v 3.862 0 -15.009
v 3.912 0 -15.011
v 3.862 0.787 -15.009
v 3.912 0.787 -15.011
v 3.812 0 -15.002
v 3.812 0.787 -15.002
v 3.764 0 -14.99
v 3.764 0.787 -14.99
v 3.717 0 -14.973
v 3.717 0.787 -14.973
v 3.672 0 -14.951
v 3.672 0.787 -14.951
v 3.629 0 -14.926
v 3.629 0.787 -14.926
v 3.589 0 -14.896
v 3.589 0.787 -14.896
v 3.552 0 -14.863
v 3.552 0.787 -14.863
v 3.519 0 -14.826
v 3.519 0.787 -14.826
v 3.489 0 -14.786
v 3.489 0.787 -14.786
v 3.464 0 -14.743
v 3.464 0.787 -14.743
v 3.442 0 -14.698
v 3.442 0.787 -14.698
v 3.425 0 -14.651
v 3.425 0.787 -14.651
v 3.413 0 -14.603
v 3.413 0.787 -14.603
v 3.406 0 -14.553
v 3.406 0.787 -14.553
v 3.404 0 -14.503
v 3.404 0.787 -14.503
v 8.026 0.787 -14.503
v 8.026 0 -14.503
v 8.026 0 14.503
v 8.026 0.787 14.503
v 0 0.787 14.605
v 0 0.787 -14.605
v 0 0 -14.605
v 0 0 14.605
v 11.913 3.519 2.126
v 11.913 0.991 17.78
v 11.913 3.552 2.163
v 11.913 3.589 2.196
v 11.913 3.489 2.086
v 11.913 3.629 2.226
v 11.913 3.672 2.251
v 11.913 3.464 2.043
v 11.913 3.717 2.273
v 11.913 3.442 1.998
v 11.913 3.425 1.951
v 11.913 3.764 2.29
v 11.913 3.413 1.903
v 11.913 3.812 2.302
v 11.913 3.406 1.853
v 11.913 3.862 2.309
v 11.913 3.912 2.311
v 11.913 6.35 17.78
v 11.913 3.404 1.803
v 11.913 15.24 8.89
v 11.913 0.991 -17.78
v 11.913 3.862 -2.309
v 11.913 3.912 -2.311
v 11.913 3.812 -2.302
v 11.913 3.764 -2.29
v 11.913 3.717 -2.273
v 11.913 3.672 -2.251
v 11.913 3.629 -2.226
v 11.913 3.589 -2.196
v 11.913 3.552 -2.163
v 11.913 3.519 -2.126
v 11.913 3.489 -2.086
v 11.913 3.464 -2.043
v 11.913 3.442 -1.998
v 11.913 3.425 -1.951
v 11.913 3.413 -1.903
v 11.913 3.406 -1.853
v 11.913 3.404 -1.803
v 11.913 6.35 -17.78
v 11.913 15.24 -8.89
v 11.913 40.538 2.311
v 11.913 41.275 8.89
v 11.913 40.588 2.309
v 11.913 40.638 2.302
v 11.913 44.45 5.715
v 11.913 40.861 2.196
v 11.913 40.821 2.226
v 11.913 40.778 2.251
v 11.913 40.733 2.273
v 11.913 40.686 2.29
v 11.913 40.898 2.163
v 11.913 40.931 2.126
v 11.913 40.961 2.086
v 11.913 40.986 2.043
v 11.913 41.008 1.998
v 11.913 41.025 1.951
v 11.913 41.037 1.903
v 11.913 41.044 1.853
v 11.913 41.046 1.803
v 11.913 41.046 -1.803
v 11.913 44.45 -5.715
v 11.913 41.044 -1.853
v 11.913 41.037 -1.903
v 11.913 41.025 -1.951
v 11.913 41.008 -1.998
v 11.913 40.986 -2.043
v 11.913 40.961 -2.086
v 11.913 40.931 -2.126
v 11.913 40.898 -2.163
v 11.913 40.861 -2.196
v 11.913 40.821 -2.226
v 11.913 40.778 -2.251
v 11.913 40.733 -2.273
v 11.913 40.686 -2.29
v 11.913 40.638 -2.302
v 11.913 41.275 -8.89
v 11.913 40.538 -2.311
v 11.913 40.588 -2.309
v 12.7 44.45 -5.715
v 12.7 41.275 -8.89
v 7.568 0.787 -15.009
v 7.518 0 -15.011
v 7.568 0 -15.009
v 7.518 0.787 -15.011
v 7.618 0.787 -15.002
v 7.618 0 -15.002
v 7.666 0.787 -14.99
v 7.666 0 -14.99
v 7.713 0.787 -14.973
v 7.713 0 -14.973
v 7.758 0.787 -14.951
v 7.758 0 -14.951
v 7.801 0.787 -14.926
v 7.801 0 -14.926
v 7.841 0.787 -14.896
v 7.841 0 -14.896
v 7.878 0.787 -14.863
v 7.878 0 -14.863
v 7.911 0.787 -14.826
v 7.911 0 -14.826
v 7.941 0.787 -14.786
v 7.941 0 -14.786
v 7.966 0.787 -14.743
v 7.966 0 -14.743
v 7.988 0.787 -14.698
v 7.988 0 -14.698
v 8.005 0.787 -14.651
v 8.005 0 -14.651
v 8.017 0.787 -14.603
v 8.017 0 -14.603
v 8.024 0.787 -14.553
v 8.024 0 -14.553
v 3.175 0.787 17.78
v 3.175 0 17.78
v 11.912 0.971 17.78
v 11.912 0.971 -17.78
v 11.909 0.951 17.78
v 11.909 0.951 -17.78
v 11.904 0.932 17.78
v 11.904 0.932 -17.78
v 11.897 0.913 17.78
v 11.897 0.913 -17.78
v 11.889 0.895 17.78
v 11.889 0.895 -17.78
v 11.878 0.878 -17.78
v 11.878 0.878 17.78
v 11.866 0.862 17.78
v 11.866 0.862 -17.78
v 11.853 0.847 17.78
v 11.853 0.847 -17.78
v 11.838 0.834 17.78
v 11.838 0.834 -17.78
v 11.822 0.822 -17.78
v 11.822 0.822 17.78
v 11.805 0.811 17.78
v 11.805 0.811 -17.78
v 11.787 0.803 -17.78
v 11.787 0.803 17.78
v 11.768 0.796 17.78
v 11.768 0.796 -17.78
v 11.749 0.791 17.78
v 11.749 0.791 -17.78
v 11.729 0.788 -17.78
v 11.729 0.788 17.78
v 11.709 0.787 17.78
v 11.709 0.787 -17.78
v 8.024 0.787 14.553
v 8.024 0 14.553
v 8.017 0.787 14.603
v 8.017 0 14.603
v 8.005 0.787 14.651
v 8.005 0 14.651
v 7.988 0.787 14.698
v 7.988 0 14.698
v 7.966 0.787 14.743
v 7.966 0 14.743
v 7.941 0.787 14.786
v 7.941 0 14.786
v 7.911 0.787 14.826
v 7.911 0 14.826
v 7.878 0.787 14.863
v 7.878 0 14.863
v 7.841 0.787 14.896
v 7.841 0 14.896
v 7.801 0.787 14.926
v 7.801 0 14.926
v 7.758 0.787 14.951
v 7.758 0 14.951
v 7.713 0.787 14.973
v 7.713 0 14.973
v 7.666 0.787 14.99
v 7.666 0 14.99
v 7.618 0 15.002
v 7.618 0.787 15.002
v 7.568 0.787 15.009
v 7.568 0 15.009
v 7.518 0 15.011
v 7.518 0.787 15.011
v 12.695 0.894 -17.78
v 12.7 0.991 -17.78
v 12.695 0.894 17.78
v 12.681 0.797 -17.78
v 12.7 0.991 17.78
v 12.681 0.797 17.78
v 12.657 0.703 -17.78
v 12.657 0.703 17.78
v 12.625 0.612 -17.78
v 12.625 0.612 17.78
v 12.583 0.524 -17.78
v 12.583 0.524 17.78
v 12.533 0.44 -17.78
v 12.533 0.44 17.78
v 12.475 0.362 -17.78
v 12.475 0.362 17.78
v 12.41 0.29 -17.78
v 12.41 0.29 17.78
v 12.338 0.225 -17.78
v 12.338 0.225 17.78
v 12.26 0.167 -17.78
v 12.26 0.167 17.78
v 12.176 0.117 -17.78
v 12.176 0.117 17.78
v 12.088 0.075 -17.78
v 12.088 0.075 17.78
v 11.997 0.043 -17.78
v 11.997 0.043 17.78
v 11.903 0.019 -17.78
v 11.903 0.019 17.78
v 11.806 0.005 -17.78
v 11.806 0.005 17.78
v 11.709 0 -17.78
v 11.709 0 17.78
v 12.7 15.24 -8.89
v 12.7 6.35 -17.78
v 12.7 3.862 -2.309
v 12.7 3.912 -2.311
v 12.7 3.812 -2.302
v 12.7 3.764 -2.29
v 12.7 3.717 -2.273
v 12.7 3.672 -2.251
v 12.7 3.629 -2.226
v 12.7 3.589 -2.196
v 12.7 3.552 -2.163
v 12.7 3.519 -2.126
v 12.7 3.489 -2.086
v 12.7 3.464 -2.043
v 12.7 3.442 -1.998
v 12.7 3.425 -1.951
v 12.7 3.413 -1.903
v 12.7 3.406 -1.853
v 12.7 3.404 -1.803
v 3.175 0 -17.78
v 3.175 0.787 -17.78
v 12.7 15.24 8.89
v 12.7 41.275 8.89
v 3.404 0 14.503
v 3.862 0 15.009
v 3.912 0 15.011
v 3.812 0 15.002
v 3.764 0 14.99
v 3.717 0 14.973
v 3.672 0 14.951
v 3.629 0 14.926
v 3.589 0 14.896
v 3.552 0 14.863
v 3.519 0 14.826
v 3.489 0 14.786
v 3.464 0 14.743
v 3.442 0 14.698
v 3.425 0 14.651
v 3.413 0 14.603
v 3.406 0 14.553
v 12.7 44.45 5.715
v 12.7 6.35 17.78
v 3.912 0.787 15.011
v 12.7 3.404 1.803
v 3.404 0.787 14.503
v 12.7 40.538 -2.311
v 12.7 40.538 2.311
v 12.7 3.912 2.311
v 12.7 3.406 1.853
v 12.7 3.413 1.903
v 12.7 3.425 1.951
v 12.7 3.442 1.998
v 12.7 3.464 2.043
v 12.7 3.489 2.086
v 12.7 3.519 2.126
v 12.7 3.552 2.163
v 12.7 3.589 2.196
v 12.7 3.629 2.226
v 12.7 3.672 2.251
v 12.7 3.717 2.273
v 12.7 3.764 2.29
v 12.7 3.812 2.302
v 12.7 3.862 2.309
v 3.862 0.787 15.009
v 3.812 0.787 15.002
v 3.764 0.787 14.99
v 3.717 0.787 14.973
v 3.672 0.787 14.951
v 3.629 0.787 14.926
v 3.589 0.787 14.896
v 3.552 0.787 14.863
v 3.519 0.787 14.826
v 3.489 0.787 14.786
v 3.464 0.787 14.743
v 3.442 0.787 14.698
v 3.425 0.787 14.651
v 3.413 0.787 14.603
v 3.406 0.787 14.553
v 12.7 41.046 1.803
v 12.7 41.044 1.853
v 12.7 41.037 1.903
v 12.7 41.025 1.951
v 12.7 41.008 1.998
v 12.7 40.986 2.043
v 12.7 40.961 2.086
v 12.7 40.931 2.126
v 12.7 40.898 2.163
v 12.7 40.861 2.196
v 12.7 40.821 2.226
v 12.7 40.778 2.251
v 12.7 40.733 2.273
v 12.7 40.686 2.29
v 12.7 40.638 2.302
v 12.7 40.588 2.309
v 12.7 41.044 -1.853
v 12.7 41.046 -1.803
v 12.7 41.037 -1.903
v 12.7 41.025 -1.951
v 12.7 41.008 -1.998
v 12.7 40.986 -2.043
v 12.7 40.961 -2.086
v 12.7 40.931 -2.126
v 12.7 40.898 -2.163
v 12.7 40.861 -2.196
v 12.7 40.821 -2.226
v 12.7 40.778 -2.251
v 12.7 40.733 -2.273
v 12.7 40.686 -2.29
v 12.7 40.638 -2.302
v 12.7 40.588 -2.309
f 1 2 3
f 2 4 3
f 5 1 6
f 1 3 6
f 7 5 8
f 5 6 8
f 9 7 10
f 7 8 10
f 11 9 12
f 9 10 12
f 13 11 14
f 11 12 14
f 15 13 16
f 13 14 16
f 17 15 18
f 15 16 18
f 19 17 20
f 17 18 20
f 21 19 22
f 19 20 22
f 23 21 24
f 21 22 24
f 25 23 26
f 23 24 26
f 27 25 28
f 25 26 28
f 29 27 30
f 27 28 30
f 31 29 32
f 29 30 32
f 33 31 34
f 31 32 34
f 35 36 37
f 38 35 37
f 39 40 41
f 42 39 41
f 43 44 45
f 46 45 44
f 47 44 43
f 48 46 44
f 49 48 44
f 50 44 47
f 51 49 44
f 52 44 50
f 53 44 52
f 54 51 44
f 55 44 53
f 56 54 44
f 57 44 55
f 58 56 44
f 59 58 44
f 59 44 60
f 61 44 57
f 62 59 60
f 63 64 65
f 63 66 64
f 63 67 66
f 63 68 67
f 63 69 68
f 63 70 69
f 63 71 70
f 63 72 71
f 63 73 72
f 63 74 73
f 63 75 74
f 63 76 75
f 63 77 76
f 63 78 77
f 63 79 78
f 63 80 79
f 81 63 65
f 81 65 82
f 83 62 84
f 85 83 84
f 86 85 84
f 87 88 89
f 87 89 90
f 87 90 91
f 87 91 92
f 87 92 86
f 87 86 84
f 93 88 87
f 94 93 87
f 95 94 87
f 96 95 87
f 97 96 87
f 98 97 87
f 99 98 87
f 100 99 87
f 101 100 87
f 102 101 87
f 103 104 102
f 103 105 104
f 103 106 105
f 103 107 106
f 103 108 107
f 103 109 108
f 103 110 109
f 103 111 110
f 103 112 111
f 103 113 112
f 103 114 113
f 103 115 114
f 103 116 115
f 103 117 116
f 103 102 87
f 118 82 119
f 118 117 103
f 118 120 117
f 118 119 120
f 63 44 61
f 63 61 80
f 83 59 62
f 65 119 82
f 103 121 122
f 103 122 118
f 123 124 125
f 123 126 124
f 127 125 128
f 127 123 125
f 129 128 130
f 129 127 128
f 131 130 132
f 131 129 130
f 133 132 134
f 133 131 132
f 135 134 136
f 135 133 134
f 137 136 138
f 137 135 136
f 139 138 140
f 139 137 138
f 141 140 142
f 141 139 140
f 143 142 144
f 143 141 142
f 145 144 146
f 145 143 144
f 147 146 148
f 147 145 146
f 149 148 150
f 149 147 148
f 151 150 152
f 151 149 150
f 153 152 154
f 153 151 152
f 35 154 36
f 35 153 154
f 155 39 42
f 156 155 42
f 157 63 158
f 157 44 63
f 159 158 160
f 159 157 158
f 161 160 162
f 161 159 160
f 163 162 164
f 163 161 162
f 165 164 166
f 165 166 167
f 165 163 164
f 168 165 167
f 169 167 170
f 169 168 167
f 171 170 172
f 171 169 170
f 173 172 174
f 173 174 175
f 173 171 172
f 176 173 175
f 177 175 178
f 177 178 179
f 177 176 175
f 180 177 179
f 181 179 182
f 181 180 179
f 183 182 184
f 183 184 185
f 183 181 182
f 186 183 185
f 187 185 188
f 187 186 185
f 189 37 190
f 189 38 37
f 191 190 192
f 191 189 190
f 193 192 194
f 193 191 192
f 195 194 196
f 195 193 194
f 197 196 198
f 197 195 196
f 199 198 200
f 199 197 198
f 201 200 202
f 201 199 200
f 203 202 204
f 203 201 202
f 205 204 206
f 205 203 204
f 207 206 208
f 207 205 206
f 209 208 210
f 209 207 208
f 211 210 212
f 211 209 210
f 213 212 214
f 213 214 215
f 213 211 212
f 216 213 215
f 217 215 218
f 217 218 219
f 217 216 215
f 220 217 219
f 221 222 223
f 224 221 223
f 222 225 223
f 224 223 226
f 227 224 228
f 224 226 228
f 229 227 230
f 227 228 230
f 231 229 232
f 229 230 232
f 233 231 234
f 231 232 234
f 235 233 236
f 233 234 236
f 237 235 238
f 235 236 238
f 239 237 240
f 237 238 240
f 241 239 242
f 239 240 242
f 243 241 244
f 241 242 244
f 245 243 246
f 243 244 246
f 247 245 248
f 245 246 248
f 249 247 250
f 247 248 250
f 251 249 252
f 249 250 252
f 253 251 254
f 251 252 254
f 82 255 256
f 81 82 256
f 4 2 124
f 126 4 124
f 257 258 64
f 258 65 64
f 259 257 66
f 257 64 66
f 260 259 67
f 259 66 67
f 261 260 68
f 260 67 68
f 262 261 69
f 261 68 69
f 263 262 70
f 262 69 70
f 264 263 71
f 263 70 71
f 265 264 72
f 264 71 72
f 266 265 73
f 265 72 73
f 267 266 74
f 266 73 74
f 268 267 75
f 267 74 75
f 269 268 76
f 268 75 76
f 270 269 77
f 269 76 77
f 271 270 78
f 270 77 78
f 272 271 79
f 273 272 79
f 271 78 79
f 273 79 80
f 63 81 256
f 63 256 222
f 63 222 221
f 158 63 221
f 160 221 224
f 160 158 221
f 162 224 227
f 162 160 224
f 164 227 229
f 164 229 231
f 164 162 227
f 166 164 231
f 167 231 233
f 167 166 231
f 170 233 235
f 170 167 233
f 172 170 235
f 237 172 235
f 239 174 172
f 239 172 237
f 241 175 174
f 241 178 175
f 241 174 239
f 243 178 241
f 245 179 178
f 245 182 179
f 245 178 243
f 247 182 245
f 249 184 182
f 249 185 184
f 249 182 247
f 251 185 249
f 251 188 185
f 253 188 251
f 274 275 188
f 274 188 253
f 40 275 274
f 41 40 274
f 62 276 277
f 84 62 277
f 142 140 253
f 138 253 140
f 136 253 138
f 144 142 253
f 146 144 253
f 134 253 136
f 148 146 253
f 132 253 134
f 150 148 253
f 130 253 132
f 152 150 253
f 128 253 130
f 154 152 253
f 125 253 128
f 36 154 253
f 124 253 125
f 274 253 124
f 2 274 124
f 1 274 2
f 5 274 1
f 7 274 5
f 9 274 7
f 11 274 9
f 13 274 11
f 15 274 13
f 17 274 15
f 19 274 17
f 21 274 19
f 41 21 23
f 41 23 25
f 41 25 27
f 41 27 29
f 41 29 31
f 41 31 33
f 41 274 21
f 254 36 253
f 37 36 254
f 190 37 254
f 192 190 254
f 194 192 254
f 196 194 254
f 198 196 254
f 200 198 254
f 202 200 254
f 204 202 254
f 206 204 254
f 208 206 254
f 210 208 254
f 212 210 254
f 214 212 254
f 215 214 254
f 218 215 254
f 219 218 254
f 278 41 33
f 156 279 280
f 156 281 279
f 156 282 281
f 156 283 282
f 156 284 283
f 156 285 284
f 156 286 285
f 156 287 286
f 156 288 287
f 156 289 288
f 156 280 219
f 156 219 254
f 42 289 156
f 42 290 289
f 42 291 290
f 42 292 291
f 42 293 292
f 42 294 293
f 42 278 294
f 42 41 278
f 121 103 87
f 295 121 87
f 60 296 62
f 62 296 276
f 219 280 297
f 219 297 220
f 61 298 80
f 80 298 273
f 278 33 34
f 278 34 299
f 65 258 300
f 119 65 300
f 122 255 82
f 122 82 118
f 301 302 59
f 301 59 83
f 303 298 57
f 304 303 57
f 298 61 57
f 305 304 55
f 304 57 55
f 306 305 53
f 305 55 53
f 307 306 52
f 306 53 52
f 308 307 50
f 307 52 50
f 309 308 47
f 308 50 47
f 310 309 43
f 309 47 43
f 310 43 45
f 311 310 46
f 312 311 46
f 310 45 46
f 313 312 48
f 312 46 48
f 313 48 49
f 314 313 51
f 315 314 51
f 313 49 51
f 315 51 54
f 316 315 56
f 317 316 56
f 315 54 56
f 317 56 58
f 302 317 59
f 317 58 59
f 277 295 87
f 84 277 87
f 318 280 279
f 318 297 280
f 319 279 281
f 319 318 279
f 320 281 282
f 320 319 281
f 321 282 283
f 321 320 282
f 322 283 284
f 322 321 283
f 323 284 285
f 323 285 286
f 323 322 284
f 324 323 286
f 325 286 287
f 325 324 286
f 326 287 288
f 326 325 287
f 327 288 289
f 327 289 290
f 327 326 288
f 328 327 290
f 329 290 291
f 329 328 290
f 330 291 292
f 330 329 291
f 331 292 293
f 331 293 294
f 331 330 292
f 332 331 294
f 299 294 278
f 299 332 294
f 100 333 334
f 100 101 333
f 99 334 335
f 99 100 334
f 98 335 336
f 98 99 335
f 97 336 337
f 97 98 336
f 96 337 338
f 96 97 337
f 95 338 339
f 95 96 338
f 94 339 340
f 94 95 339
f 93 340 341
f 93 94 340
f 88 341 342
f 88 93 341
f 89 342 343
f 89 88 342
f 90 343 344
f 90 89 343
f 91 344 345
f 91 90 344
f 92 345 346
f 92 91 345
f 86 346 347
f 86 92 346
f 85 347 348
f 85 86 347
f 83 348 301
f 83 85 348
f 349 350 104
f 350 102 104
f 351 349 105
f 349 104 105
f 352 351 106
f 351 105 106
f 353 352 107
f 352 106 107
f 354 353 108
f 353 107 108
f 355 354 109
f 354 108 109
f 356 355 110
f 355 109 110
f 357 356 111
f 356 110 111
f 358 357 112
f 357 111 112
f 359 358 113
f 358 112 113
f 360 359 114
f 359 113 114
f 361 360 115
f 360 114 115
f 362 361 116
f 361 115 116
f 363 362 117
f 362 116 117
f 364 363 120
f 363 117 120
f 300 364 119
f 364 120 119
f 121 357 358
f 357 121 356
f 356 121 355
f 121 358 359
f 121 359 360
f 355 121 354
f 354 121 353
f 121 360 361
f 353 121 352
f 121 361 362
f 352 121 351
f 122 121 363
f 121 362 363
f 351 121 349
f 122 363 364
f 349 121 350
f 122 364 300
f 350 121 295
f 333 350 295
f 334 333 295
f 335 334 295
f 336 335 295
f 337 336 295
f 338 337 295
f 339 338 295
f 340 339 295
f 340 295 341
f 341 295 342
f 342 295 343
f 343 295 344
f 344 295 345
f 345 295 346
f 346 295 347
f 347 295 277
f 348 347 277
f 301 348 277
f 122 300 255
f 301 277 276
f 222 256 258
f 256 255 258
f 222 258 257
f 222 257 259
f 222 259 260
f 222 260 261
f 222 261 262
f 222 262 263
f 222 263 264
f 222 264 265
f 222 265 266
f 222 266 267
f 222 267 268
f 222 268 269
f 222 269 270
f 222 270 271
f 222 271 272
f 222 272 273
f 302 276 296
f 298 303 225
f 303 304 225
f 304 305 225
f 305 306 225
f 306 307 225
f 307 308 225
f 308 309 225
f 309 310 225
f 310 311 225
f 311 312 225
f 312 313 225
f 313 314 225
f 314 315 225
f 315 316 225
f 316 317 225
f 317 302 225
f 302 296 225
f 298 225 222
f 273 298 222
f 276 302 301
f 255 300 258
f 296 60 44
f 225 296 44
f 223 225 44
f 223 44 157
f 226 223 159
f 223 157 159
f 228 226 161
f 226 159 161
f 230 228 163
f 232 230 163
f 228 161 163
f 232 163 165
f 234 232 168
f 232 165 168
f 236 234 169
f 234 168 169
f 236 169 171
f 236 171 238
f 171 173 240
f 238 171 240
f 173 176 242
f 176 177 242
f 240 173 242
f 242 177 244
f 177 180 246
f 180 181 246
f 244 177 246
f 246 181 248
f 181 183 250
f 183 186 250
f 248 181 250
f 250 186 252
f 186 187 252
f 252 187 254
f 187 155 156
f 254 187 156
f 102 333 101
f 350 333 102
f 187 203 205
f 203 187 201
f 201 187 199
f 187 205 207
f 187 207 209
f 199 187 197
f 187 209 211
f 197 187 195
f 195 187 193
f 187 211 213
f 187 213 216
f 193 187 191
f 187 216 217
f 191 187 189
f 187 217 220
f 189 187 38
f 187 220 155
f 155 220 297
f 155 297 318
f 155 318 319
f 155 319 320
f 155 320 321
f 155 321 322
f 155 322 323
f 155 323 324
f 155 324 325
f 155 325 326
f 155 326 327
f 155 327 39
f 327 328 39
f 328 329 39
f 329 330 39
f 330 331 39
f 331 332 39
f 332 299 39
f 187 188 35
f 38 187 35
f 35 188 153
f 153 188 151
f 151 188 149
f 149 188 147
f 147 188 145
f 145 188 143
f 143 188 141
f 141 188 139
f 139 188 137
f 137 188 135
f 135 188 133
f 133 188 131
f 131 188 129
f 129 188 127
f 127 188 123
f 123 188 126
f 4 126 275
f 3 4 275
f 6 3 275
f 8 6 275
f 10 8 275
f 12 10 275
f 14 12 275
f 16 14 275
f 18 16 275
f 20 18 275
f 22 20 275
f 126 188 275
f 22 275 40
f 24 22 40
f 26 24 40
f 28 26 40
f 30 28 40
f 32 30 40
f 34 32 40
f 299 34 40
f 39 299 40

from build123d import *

# Parameters (mm, degrees)
SKETCH1_W           = 44.45
SKETCH1_H           = 35.56
BOSS_EXTRUDE1_DEPTH = 12.7
SKETCH2_W           = 11.9126
SKETCH2_H           = 43.6626
CUT_EXTRUDE1_DEPTH  = 36.56
SKETCH3_W           = 8.89
SKETCH3_H           = 29.21
CUT_EXTRUDE2_DEPTH  = 13.7
SKETCH4_W           = 8.89
SKETCH4_H           = 38.1
CUT_EXTRUDE3_DEPTH  = 13.7
SKETCH5_W           = 4.6228
SKETCH5_H           = 30.0228
CUT_EXTRUDE4_DEPTH  = 45.45
SKETCH6_W           = 4.6228
SKETCH6_H           = 37.6428
CUT_EXTRUDE5_DEPTH  = 13.7
DRAFT1_ANGLE        = 45
DRAFT2_ANGLE        = 45
CHAMFER1_SIZE       = 3.175
FILLET1_R           = 0.2032
FILLET2_R           = 0.508
FILLET3_R           = 0.9906


with BuildPart() as part:
    # Sketch1 → Boss-Extrude1 (new body)
    with BuildSketch(Plane(origin=(0, 0, 0), x_dir=(0, -1, 0), z_dir=(-1, 0, 0))):
        with Locations((-22.225, 0)):
            Rectangle(SKETCH1_W, SKETCH1_H)
    extrude(amount=-BOSS_EXTRUDE1_DEPTH)

    # Sketch2 → Cut-Extrude1 (cut, through all)
    with BuildSketch(Plane(origin=(0, 0, -17.78), x_dir=(-1, 0, 0), z_dir=(0, 0, -1))):
        with Locations((-5.9563, 22.6187)):
            Rectangle(SKETCH2_W, SKETCH2_H)
    extrude(amount=-CUT_EXTRUDE1_DEPTH, mode=Mode.SUBTRACT)

    # Sketch3 → Cut-Extrude2 (cut, through all)
    with BuildSketch(Plane(origin=(12.7, 0, 0), x_dir=(0, 0, -1), z_dir=(1, 0, 0))):
        with Locations((13.335, 29.845)):
            Rectangle(SKETCH3_W, SKETCH3_H)
    extrude(amount=-CUT_EXTRUDE2_DEPTH, mode=Mode.SUBTRACT)

    # Sketch4 → Cut-Extrude3 (cut, through all)
    with BuildSketch(Plane(origin=(12.7, 0, 0), x_dir=(0, 0, -1), z_dir=(1, 0, 0))):
        with Locations((-13.335, 25.4)):
            Rectangle(SKETCH4_W, SKETCH4_H)
    extrude(amount=-CUT_EXTRUDE3_DEPTH, mode=Mode.SUBTRACT)

    # Sketch5 → Cut-Extrude4 (cut, through all)
    with BuildSketch(Plane.XZ):
        with Locations((5.715, 0)):
            Rectangle(SKETCH5_W, SKETCH5_H)
    extrude(amount=-CUT_EXTRUDE4_DEPTH, mode=Mode.SUBTRACT)

    # Sketch6 → Cut-Extrude5 (cut, through all)
    with BuildSketch(Plane(origin=(12.7, 0, 0), x_dir=(0, 0, -1), z_dir=(1, 0, 0))):
        with Locations((0, 22.225)):
            Rectangle(SKETCH6_W, SKETCH6_H)
    extrude(amount=-CUT_EXTRUDE5_DEPTH, mode=Mode.SUBTRACT)

    # Draft1
    draft1_faces = [part.faces().sort_by_distance(p)[0] for p in [
        (12.3063, 15.24, -13.335),
    ]]
    draft(draft1_faces, Plane(origin=(0, 44.45, -8.89), x_dir=(-1, 0, 0), z_dir=(0, 0, -1)), DRAFT1_ANGLE)

    # Draft2
    draft2_faces = [part.faces().sort_by_distance(p)[0] for p in [
        (12.3063, 6.35, 13.335),
    ]]
    draft(draft2_faces, Plane(origin=(12.7, 0, 17.78), x_dir=(1, 0, 0), z_dir=(0, 0, 1)), DRAFT2_ANGLE)

    # Chamfer1
    chamfer1_edges = [part.edges().sort_by_distance(p)[0] for p in [
        (0, 0.3937, -17.78),
        (12.3063, 44.45, -8.89),
        (0, 0.3937, 17.78),
        (12.3063, 44.45, 8.89),
    ]]
    chamfer(chamfer1_edges, length=CHAMFER1_SIZE)

    # Fillet1
    fillet1_edges = [part.edges().sort_by_distance(p)[0] for p in [
        (11.9126, 0.7874, 0),
    ]]
    fillet(fillet1_edges, radius=FILLET1_R)

    # Fillet2
    fillet2_edges = [part.edges().sort_by_distance(p)[0] for p in [
        (8.0264, 0.3937, 15.0114),
        (8.0264, 0.3937, -15.0114),
        (3.4036, 0.3937, -15.0114),
        (3.4036, 0.3937, 15.0114),
        (12.3063, 41.0464, 2.3114),
        (12.3063, 41.0464, -2.3114),
        (12.3063, 3.4036, -2.3114),
        (12.3063, 3.4036, 2.3114),
    ]]
    fillet(fillet2_edges, radius=FILLET2_R)

    # Fillet3
    fillet3_edges = [part.edges().sort_by_distance(p)[0] for p in [
        (12.7, 0, 0),
    ]]
    fillet(fillet3_edges, radius=FILLET3_R)


solid = part.part
